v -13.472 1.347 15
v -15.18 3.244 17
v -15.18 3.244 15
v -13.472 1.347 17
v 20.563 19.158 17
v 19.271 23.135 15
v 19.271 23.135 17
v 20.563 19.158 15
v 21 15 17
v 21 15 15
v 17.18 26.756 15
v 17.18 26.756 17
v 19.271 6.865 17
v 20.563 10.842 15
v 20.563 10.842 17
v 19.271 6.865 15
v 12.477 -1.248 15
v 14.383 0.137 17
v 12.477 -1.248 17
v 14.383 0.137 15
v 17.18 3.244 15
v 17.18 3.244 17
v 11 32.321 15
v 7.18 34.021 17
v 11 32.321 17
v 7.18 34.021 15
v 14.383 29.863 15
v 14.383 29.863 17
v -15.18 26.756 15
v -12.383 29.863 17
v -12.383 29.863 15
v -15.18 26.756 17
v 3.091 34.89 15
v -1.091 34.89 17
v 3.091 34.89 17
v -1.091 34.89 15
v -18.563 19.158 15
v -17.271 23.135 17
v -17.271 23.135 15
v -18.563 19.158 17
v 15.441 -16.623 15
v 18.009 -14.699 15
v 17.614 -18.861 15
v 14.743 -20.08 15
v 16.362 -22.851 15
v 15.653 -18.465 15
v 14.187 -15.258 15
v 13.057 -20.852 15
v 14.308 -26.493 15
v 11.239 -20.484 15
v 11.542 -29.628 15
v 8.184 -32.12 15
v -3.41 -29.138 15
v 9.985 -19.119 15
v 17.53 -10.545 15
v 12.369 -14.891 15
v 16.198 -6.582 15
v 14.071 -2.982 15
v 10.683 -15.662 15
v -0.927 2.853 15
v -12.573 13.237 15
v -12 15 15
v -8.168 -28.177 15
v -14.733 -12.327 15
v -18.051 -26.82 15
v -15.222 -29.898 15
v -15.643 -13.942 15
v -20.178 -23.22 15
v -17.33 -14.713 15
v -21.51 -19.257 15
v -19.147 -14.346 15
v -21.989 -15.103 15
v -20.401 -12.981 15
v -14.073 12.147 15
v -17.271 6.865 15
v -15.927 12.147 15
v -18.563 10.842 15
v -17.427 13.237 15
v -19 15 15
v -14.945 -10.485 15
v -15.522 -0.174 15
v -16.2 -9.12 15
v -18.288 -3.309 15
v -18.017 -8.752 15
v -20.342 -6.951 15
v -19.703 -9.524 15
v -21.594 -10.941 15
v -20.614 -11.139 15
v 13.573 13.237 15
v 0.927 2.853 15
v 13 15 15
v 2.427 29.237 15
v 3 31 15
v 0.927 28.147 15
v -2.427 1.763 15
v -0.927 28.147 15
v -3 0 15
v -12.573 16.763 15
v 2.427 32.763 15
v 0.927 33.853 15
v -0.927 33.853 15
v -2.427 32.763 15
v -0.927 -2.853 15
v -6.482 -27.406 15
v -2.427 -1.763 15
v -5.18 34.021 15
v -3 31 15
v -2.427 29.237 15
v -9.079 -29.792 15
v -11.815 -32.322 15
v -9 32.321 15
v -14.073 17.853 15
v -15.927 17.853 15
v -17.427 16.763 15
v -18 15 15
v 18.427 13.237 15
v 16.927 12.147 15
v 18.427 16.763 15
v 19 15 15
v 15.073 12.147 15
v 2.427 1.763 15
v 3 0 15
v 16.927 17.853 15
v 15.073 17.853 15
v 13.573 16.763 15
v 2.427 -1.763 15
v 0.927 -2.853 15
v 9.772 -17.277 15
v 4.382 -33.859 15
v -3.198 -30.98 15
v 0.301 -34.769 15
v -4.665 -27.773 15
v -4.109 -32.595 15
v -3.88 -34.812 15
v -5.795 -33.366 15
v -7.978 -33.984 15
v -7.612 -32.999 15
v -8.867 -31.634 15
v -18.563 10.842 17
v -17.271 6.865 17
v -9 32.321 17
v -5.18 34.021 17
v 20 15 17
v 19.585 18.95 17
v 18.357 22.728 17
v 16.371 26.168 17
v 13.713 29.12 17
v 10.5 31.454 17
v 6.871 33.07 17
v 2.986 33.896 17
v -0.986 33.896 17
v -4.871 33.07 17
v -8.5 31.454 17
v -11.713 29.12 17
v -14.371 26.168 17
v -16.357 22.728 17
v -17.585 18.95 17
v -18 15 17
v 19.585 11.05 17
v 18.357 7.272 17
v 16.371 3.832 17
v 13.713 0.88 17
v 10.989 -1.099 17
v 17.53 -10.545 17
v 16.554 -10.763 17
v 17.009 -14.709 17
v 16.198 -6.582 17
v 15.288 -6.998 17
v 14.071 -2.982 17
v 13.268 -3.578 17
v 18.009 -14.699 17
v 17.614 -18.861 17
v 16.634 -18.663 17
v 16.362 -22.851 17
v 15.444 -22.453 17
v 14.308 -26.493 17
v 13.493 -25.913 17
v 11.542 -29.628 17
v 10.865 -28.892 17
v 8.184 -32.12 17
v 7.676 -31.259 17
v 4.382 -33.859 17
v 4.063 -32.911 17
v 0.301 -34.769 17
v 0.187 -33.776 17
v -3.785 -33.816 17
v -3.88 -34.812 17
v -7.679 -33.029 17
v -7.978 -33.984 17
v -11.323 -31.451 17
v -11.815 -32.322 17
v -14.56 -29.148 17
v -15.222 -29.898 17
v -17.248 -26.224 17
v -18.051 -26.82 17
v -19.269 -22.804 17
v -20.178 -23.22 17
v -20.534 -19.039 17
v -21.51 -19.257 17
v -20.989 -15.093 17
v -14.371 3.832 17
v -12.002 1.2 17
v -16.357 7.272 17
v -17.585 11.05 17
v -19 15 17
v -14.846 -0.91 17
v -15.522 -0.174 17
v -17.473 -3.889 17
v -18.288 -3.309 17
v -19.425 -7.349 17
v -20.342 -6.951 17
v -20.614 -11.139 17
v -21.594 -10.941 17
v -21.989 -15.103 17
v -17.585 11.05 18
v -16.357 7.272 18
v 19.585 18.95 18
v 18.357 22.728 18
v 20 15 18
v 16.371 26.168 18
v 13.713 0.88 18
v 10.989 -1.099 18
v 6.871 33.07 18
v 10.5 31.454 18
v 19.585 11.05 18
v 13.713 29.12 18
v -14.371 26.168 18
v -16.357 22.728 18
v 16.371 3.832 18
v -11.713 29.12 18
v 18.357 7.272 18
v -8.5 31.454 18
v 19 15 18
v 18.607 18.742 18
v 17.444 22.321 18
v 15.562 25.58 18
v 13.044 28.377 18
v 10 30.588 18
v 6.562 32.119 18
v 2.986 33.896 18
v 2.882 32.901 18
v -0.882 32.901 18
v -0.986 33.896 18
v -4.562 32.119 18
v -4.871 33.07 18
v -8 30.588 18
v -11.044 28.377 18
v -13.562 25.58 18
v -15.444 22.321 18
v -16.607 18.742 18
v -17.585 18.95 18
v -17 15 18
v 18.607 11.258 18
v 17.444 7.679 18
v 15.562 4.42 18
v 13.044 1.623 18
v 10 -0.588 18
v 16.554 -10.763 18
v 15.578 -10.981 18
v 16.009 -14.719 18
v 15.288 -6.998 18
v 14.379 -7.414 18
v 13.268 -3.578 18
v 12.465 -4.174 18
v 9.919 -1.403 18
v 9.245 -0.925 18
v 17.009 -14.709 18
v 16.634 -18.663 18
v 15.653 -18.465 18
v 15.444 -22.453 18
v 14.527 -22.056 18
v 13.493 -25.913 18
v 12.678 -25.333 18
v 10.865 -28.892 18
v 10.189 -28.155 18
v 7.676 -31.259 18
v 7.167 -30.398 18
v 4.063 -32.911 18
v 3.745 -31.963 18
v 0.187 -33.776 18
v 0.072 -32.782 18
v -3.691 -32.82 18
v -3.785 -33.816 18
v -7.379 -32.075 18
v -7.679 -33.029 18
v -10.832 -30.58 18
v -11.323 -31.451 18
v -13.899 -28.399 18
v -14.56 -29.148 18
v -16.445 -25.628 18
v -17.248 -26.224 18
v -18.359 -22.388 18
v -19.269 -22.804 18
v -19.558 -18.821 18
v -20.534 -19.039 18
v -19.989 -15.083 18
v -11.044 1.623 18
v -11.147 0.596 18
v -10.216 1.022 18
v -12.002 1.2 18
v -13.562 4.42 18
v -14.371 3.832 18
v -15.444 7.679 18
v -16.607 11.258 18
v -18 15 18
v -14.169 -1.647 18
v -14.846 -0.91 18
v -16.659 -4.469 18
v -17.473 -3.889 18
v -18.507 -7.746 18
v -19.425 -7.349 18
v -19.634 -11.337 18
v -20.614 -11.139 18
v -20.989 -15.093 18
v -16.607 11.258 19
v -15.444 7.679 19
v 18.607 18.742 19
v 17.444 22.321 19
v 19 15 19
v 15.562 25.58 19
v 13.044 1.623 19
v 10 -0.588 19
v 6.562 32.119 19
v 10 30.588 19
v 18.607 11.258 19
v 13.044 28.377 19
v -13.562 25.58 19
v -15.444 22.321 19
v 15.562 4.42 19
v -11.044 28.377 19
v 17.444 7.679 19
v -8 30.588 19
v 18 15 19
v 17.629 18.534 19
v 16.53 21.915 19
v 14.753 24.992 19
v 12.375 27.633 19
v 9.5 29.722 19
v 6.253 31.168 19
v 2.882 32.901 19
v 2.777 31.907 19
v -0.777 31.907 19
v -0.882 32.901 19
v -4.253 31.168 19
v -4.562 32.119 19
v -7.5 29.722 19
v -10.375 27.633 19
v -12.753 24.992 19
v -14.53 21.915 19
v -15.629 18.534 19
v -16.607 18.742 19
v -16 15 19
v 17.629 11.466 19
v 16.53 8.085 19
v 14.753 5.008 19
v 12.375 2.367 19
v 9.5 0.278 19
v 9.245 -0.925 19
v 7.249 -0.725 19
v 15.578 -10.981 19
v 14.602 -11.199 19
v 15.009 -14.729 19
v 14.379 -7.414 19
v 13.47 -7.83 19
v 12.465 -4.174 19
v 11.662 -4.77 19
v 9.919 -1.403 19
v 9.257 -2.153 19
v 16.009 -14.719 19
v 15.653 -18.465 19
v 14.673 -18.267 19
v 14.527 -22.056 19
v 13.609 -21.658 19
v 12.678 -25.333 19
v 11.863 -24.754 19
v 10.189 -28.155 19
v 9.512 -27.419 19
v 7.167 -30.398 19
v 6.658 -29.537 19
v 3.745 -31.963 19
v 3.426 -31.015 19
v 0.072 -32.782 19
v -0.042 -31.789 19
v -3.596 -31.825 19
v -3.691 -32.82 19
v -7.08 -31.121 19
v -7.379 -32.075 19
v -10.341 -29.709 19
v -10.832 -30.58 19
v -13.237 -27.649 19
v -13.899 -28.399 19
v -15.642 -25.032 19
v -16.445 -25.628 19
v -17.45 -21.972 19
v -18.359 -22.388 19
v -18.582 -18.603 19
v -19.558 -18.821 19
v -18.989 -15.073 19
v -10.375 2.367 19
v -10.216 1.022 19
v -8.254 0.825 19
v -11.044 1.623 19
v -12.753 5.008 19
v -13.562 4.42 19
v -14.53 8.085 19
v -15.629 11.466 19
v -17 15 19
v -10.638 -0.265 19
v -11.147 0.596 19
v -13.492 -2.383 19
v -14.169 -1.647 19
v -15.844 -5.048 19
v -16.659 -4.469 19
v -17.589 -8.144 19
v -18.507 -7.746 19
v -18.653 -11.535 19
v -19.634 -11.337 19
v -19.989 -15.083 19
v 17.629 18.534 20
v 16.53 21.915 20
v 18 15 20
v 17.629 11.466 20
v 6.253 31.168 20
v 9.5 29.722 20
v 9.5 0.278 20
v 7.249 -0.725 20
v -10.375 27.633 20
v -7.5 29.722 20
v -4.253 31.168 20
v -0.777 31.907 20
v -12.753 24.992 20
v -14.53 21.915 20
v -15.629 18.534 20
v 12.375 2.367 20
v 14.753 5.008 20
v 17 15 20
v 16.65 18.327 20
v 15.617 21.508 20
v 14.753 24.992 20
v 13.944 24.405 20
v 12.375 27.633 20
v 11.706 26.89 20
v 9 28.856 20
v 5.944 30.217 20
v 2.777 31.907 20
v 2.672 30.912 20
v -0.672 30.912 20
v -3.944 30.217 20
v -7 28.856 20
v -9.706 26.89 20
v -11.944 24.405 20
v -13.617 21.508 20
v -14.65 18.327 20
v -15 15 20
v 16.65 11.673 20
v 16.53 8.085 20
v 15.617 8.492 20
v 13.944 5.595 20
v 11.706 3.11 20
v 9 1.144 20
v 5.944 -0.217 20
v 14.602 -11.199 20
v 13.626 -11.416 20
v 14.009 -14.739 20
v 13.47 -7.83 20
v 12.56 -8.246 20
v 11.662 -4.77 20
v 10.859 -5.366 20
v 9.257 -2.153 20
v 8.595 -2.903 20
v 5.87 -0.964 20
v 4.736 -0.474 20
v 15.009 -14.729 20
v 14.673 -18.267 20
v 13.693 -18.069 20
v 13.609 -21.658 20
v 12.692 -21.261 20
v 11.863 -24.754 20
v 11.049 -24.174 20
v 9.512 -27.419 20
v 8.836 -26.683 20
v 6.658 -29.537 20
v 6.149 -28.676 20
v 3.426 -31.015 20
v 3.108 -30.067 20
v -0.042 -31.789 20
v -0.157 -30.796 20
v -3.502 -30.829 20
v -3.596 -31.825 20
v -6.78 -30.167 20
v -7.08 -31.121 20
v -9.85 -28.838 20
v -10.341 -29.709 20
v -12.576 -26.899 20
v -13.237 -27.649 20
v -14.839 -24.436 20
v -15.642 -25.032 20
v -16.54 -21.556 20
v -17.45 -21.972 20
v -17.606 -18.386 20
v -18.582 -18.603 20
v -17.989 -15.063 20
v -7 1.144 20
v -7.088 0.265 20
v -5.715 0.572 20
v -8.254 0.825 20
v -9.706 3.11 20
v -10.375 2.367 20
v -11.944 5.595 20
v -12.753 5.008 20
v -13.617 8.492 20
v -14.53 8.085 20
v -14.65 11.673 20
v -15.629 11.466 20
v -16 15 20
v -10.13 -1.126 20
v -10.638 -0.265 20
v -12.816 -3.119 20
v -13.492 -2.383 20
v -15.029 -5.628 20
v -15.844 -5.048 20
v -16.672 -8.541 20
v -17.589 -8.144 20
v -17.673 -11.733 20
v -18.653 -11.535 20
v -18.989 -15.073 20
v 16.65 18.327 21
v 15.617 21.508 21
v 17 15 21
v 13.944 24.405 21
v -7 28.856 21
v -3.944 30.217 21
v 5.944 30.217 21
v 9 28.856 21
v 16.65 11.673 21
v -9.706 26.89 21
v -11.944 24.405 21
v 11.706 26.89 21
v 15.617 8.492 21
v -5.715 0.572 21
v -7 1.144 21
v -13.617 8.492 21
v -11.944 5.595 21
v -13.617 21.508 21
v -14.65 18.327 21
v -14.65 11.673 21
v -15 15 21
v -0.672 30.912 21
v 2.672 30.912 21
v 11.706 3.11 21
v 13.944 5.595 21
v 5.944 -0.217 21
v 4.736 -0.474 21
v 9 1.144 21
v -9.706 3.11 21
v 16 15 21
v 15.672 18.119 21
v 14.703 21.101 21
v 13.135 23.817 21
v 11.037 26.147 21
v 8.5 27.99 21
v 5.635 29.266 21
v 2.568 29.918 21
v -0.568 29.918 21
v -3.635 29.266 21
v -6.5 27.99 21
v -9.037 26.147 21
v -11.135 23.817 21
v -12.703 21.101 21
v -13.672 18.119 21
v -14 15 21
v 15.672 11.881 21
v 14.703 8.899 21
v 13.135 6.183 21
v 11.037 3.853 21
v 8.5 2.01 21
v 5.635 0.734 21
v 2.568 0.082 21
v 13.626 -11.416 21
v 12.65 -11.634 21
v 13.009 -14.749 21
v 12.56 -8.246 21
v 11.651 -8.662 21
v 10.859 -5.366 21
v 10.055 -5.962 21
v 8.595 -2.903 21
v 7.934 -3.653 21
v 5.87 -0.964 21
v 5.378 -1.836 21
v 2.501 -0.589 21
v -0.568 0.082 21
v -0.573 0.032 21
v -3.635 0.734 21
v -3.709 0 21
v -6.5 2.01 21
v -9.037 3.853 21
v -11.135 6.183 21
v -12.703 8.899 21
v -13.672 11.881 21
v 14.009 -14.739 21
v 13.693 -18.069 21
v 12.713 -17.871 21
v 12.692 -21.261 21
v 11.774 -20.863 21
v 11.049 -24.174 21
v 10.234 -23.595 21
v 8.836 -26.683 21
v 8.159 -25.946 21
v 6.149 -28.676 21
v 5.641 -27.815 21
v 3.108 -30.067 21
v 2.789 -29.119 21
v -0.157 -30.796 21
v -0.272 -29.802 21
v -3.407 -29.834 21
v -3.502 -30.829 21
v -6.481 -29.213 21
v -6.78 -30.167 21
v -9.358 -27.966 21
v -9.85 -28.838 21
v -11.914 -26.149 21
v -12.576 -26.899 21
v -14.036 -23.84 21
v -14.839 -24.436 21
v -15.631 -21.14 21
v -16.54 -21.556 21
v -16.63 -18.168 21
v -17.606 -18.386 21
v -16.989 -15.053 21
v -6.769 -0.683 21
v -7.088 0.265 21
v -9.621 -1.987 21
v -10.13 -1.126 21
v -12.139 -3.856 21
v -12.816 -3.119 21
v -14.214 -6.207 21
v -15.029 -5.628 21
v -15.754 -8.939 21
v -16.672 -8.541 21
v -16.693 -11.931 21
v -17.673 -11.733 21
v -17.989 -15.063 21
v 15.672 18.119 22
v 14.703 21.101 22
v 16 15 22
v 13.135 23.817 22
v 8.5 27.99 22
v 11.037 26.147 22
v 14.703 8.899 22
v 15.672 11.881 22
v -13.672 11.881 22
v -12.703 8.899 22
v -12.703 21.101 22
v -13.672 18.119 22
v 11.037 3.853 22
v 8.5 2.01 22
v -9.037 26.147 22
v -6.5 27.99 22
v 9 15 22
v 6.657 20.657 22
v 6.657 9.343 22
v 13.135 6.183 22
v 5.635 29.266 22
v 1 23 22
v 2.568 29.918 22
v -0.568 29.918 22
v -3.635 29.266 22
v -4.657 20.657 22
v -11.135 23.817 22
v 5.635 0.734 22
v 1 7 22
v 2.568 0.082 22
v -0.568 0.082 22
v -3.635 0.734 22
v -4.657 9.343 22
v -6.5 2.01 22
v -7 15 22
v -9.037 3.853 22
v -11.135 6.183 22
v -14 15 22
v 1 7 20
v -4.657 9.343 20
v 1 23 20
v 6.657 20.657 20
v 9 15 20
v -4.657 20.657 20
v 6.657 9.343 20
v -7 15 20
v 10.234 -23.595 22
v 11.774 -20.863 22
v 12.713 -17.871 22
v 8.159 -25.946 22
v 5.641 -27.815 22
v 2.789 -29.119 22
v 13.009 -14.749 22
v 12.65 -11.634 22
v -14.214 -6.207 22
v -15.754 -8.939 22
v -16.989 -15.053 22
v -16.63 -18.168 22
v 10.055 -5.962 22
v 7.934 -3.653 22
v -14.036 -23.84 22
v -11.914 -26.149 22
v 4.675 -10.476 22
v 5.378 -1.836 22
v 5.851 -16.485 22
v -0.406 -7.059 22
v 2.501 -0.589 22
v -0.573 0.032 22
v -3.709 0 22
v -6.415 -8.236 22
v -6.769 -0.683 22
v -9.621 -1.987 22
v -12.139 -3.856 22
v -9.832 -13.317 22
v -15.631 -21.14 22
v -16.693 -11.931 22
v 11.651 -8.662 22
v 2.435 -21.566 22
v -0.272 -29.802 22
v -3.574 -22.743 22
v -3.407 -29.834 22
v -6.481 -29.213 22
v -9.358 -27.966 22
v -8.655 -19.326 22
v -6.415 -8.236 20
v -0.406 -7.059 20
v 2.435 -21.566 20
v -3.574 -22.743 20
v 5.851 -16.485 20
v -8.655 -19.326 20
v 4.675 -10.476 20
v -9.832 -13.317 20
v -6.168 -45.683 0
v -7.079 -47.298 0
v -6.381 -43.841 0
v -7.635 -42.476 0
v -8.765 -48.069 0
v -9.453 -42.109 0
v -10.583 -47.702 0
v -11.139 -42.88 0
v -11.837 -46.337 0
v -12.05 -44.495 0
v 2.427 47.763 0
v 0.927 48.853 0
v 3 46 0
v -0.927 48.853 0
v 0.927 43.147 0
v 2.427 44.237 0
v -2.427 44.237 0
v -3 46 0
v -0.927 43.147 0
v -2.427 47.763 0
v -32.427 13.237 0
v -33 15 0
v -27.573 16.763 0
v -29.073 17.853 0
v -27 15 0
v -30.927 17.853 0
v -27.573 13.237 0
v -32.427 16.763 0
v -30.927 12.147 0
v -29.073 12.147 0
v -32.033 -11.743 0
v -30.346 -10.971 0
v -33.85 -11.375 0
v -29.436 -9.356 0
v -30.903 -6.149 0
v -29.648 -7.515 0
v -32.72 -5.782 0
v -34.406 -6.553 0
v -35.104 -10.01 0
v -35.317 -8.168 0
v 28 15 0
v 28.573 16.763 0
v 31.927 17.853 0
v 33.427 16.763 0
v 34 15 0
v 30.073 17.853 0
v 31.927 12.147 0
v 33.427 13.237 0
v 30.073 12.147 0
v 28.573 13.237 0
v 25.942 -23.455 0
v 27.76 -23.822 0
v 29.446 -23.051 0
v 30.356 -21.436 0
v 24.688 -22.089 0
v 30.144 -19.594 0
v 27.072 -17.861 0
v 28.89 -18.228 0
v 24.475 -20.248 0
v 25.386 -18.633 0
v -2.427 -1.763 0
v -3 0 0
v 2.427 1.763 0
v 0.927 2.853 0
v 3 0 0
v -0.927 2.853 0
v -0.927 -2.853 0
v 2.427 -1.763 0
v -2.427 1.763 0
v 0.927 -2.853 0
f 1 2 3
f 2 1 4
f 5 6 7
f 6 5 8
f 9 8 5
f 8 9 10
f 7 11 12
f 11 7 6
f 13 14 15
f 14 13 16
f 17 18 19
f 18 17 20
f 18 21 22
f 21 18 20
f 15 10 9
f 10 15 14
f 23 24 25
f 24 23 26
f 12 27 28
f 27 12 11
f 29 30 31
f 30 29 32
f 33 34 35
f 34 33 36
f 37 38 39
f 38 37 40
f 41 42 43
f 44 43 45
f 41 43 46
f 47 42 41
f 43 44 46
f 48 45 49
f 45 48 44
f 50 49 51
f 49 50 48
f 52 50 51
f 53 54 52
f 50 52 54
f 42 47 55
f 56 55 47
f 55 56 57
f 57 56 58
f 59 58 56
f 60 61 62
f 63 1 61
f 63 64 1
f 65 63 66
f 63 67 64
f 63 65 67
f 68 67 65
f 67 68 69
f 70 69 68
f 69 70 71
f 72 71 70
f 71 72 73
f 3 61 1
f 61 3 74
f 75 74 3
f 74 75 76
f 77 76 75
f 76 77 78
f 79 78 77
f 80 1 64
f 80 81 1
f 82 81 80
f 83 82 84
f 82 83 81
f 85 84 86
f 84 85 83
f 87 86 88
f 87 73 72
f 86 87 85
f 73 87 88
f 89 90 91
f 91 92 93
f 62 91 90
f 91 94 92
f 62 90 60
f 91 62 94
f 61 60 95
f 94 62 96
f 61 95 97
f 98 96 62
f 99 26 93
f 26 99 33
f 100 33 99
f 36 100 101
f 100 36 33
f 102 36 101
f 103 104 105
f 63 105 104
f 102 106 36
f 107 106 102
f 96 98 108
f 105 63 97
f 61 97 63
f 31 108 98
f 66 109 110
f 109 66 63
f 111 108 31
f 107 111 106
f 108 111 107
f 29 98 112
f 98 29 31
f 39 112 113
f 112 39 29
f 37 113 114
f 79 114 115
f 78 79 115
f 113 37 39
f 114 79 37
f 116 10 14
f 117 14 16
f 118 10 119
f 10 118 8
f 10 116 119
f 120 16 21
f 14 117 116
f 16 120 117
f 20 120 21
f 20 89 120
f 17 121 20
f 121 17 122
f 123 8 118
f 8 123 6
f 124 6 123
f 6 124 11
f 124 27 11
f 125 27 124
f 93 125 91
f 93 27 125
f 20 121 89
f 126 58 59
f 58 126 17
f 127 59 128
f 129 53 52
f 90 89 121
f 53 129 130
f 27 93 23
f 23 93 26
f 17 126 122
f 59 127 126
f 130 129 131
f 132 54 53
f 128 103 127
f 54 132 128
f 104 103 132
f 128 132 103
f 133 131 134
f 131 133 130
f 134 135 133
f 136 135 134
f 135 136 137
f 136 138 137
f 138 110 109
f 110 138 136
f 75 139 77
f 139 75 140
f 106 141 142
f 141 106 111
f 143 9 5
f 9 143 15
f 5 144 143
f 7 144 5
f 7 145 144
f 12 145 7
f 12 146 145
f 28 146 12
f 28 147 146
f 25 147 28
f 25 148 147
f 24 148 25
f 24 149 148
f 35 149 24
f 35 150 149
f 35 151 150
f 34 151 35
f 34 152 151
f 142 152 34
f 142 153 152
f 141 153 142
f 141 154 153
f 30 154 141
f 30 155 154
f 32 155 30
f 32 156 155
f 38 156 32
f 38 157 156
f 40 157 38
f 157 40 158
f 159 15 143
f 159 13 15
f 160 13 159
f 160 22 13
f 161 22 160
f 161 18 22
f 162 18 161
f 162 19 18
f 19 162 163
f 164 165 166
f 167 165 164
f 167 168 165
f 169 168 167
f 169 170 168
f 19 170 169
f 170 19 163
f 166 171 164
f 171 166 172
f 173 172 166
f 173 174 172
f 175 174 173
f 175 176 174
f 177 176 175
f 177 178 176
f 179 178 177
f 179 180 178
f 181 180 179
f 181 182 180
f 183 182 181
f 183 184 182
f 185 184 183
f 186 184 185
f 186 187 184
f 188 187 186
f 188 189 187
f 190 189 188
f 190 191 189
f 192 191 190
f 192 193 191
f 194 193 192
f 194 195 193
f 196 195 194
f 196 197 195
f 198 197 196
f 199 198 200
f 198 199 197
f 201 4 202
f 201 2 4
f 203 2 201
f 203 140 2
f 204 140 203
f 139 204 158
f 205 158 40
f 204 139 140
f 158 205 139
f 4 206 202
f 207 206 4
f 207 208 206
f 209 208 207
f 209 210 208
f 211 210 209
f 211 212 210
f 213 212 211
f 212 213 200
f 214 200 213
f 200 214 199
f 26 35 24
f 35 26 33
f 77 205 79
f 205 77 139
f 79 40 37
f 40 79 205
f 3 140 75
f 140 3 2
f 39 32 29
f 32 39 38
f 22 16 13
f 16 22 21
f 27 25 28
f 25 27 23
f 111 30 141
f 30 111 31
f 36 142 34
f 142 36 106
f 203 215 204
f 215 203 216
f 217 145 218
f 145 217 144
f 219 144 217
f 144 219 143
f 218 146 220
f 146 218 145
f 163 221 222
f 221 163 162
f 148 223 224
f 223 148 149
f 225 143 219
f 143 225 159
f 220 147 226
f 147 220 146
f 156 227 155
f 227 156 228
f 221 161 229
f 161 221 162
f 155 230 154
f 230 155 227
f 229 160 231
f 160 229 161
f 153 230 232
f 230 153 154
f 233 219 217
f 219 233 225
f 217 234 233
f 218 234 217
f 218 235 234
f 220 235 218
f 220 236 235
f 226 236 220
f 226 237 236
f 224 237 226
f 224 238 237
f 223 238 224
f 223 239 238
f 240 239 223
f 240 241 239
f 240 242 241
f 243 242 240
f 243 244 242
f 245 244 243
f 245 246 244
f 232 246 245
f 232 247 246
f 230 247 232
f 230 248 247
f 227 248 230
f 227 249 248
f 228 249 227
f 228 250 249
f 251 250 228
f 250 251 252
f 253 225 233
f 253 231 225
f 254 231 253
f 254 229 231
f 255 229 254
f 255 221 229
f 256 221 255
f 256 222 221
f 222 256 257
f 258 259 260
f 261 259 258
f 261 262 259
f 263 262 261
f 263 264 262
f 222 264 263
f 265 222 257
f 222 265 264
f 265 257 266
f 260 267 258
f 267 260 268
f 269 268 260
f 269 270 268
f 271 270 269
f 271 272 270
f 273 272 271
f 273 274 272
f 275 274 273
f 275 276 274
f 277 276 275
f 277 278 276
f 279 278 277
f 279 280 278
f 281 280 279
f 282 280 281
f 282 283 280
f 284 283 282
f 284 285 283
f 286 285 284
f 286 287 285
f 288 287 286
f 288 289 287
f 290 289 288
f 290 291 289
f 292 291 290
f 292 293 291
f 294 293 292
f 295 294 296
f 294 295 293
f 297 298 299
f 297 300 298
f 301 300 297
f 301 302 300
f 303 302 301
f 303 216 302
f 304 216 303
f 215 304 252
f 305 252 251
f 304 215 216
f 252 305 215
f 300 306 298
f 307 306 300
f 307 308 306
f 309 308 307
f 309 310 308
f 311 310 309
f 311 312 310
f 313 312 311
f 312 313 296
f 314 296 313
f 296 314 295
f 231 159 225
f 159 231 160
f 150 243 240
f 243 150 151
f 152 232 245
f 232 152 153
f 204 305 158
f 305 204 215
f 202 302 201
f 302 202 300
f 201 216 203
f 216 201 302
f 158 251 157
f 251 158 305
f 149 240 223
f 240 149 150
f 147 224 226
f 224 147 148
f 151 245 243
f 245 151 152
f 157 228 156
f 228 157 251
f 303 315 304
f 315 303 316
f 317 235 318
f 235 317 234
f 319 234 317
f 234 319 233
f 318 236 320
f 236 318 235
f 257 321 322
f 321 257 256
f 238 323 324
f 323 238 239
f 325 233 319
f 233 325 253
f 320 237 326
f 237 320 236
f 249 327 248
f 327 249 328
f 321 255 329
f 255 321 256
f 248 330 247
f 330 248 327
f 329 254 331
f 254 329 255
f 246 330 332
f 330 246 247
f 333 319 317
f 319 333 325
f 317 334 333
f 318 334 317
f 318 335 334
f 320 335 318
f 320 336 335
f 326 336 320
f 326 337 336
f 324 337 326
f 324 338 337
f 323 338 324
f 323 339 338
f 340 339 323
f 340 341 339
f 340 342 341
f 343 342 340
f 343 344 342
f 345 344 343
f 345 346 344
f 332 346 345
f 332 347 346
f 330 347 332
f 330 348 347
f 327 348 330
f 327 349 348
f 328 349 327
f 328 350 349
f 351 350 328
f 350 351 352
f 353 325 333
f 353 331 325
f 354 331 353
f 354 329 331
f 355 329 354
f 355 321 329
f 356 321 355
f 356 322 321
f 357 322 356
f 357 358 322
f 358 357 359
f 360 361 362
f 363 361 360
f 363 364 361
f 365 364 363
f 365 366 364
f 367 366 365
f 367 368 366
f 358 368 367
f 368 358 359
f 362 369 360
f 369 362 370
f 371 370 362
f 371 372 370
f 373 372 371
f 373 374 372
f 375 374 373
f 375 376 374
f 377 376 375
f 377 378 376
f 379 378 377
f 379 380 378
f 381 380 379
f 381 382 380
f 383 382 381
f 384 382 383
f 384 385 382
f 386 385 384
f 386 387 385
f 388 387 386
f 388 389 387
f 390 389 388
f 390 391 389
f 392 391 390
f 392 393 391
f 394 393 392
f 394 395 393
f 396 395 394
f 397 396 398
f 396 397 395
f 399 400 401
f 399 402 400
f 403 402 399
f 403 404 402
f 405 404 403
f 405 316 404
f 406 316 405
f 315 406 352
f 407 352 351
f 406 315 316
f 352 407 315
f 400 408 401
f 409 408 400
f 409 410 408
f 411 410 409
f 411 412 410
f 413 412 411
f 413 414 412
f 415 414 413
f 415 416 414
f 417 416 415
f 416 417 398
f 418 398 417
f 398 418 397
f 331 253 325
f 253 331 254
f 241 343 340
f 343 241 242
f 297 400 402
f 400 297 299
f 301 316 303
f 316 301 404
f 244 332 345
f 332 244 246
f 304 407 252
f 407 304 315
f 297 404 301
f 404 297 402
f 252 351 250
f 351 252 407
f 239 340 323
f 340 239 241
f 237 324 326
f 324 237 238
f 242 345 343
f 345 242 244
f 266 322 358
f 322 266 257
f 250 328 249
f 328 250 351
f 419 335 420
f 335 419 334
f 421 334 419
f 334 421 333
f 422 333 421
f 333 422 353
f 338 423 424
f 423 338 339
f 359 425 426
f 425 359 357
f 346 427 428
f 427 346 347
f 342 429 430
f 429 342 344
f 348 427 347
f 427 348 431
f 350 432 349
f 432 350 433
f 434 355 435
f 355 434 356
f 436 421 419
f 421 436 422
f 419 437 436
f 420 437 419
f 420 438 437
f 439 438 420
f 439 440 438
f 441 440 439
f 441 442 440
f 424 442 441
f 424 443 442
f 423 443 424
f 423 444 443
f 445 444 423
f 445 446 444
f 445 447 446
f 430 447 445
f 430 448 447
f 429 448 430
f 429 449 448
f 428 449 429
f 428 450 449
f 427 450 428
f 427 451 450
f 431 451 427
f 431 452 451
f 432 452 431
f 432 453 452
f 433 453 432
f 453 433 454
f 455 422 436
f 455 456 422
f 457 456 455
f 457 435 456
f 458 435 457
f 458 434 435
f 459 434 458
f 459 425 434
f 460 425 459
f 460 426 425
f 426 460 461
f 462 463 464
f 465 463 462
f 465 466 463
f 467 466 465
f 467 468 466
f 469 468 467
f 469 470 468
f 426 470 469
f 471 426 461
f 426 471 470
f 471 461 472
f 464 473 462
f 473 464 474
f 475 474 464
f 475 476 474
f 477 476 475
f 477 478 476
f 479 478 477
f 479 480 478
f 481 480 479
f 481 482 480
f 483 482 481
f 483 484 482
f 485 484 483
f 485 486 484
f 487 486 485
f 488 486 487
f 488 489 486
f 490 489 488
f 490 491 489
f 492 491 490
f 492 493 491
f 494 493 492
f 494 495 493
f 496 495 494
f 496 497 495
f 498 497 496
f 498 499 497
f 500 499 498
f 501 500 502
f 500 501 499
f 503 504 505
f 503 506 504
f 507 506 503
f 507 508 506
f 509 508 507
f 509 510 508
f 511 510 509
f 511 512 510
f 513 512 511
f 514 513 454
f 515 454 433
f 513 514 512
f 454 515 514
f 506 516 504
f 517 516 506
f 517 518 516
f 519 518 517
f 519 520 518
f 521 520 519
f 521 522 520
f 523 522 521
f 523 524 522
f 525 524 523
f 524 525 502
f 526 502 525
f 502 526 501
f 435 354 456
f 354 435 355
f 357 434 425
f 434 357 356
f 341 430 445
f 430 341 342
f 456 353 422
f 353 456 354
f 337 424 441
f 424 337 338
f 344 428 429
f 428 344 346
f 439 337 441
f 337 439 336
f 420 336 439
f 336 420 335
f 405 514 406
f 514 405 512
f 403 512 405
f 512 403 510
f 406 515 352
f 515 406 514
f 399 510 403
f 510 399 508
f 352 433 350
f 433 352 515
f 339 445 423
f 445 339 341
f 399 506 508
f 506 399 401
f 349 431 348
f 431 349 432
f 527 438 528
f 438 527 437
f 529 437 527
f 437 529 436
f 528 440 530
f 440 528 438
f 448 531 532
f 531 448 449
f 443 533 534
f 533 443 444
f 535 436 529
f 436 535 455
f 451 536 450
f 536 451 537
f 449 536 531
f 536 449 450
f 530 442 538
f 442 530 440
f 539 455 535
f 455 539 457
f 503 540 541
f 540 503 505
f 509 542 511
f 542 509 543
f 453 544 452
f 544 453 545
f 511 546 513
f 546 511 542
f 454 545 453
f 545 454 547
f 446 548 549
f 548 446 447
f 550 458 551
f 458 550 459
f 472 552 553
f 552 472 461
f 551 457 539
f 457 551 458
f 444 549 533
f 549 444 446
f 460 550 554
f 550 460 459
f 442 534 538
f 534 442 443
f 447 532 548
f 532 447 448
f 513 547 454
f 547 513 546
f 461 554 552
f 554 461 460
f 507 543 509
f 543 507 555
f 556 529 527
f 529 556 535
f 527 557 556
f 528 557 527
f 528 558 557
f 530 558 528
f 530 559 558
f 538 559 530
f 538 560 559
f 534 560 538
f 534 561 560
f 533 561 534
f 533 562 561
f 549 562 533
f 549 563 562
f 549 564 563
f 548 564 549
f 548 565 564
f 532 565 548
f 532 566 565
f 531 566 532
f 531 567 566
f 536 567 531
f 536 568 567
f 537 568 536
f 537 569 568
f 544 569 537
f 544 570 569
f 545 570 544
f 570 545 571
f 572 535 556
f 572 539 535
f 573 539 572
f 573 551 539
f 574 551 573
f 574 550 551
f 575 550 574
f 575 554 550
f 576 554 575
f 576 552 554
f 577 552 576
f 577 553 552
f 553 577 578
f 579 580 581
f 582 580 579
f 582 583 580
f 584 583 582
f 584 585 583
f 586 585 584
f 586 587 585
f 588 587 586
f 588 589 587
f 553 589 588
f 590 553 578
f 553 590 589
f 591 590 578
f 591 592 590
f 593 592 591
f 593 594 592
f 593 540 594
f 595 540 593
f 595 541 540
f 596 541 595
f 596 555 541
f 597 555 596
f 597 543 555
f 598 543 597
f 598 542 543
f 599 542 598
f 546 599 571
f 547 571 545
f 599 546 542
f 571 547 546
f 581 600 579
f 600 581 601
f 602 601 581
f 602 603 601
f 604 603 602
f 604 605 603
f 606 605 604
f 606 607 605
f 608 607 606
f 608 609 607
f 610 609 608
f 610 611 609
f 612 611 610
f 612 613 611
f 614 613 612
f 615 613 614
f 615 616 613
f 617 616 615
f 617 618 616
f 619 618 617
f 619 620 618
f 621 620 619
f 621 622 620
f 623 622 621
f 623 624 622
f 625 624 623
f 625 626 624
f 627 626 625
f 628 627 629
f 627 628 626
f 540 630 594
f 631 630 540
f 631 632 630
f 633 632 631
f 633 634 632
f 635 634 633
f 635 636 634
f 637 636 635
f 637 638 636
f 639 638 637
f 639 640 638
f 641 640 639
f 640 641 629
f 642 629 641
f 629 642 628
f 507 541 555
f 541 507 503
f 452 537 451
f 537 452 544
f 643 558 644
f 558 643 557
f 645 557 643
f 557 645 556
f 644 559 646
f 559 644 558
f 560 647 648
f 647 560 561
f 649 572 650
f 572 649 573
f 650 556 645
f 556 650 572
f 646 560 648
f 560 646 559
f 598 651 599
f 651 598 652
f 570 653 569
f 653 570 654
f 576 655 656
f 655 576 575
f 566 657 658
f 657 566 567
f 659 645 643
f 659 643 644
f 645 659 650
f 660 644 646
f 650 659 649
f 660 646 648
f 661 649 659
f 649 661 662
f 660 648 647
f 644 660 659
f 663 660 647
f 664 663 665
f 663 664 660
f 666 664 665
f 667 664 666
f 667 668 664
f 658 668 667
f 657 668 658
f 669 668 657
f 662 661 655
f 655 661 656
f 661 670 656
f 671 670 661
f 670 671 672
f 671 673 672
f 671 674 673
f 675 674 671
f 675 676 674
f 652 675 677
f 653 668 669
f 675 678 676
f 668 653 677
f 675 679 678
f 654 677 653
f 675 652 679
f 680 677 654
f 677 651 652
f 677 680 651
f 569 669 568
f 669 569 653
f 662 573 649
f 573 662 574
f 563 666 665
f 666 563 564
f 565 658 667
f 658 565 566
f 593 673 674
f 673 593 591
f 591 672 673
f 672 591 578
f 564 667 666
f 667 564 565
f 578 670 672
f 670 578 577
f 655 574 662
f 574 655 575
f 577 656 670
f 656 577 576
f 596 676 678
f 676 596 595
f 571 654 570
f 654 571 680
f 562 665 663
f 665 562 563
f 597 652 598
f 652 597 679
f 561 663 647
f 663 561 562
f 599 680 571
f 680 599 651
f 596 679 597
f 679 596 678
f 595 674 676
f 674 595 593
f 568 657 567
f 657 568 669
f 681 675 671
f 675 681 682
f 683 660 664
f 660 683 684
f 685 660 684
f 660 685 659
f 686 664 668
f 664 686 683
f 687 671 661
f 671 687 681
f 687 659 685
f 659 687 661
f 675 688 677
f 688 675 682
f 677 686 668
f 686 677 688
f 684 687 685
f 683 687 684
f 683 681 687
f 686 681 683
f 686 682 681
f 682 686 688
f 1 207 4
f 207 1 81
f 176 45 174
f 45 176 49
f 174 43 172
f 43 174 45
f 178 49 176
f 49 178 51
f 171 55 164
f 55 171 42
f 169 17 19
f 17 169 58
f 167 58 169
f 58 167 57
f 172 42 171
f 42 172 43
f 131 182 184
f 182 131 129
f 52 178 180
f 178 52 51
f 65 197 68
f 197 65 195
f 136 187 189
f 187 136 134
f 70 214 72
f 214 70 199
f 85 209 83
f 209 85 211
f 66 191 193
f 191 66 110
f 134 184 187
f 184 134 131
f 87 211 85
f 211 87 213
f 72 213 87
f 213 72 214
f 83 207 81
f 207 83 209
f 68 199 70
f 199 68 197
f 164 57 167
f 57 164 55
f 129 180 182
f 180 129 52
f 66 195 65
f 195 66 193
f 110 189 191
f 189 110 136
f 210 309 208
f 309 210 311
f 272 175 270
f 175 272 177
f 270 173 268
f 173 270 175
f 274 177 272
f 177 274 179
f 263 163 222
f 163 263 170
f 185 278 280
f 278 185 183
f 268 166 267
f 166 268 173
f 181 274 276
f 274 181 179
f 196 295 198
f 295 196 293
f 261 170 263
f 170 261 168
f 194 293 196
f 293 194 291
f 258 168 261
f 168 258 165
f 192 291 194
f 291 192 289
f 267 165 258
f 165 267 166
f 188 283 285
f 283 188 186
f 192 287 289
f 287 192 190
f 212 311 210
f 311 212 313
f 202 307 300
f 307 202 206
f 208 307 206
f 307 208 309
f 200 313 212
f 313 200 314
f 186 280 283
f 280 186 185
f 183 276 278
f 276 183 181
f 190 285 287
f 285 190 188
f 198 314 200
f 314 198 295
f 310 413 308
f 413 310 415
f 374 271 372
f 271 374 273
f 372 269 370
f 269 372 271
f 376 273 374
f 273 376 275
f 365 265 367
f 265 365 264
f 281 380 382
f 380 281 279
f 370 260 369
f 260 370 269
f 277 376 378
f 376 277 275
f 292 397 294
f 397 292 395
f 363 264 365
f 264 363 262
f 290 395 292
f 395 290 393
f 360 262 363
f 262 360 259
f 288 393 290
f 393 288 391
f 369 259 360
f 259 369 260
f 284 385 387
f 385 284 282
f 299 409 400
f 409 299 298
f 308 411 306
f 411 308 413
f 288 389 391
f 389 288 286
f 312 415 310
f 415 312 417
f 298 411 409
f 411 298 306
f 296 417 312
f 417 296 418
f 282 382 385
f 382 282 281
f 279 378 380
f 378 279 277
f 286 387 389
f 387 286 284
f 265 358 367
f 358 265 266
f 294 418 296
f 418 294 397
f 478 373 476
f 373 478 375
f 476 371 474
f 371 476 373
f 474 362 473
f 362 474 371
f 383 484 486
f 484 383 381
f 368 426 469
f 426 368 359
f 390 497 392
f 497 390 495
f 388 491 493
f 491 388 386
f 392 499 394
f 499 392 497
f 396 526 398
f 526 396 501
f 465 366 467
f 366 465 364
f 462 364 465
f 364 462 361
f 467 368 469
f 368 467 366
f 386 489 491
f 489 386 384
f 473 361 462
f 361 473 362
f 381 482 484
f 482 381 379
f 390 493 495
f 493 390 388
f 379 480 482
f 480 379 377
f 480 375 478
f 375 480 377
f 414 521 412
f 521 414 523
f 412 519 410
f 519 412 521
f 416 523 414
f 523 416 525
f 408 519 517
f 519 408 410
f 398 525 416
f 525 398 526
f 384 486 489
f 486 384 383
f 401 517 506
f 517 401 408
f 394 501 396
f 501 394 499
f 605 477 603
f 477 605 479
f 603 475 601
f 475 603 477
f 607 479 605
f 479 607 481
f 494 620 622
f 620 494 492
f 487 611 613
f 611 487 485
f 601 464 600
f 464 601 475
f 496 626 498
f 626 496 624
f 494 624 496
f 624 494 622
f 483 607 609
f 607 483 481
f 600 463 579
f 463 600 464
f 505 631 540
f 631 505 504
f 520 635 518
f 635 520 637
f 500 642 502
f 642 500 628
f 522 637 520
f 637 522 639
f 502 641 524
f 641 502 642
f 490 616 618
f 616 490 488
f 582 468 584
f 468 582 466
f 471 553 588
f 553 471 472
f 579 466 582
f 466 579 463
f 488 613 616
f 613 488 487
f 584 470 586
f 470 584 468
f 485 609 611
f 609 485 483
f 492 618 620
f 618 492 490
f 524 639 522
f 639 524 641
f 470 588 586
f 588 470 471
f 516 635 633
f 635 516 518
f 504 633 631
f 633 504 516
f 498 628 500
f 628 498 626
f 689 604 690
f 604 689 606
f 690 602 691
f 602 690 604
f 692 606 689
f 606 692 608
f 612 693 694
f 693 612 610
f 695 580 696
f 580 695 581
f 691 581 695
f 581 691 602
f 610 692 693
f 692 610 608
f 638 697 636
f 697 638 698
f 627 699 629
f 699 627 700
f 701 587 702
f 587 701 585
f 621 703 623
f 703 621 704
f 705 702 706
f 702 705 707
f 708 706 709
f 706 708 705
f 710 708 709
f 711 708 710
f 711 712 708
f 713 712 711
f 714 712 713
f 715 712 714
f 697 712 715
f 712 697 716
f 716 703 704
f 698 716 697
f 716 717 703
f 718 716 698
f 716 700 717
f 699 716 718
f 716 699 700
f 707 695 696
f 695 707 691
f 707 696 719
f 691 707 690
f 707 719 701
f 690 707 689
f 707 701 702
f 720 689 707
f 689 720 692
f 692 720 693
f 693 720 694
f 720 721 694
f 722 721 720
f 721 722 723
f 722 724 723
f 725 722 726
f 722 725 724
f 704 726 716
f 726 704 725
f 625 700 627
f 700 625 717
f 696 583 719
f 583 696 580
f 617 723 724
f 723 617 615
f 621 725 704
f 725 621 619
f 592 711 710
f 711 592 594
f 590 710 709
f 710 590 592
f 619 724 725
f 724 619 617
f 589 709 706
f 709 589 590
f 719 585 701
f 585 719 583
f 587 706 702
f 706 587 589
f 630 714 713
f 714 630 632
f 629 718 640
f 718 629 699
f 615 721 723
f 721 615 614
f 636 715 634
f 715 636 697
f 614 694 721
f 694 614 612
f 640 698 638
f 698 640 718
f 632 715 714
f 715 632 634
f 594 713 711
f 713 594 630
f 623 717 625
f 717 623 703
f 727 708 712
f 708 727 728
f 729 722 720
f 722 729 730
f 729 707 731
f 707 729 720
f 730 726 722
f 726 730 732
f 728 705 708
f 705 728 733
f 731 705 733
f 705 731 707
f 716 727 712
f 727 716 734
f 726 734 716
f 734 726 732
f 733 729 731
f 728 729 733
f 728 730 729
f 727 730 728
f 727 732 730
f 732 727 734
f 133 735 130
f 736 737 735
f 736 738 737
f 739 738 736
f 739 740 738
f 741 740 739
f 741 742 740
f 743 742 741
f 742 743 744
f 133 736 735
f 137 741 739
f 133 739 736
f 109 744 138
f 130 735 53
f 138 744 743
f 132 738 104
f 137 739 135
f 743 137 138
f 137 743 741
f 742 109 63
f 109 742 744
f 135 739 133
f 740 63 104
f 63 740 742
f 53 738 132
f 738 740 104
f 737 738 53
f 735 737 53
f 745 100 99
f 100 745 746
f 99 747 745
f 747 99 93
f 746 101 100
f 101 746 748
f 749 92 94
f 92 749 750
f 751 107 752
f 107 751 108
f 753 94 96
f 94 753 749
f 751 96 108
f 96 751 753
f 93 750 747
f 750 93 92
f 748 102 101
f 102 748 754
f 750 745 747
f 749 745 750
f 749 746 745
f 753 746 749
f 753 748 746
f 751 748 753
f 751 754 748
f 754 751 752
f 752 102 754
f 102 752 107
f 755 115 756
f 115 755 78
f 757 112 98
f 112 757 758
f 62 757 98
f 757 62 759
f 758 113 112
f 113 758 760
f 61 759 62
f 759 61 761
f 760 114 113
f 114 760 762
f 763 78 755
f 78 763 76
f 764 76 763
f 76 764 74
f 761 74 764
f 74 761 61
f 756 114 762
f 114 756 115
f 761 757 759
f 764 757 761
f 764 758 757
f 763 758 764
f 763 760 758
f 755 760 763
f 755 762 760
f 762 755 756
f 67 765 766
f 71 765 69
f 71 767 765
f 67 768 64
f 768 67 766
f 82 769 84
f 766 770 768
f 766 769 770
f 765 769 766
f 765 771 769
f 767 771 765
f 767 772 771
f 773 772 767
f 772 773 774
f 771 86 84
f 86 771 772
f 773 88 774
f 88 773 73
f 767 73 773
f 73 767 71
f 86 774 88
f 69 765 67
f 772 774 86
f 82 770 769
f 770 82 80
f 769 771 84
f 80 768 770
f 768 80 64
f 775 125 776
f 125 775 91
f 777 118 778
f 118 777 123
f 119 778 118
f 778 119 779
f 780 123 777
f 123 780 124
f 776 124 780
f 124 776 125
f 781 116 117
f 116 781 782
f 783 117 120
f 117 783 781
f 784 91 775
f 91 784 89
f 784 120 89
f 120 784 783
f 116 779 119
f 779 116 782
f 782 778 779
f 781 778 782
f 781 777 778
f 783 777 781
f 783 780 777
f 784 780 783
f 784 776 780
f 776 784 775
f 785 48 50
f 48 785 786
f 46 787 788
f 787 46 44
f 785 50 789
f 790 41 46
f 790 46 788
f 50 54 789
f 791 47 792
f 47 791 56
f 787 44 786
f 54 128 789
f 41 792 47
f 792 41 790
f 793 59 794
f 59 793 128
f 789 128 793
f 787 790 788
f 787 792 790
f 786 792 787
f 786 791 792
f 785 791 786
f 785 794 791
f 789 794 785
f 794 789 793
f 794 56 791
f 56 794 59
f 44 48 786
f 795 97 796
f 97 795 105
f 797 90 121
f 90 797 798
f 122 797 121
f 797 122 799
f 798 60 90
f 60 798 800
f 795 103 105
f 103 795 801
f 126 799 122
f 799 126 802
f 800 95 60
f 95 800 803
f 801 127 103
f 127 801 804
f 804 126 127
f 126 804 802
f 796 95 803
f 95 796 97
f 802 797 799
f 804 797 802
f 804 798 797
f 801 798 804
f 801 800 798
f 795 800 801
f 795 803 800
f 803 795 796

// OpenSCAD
difference(){
		translate([1,15,15]) 
		for(i = [0:5]){
			translate([0,0,i])
			cylinder(h=2, r=(20-i), fn = 8); 
		}
		translate([1,15,20])
		cylinder(h=2, r=8, $fn = 8);	
	}

mirror([1,10,0]) 
	difference(){
		translate([1,15,15]) 
		for(i = [0:5]){
			translate([0,0,i])
			cylinder(h=2, r=(20-i), 	fn = 8);
		}
		translate([1,15,20])
		cylinder(h=2, r=8, $fn = 8);
	}
 		
mirror([1,10,0]) 
	multmatrix(m = [ [1, 0, 0, 0],
                 [0, 1, -1, 46],
                 [0, 0, 1, 0],
                 [0, 0, 0,  1]
               ]) 
	cylinder(h=15,r=3); 
	
	multmatrix(m = [ [1, 0, 0, 0],
                 [0, 1, -1, 46],
                 [0, 0, 1, 0],
                 [0, 0, 0,  1]
               ]) 
	cylinder(h=15,r=3); 
	
	multmatrix(m = [ [1, 0, 1, -30],
                 [0, 1, 0, 15],
                 [0, 0, 1, 0],
                 [0, 0, 0,  1]
               ]) 
	cylinder(h=15,r=3); 

mirror([1,10,0]) 
	multmatrix(m = [ [1, 0, 1, -30],
                 [0, 1, 0, 15],
                 [0, 0, 1, 0],
                 [0, 0, 0,  1]
               ]) 
	cylinder(h=15,r=3); 


	multmatrix(m = [ [1, 0, -1, 31],
                 [0, 1, 0, 15],
                 [0, 0, 1, 0],
                 [0, 0, 0,  1]
               ]) 
	cylinder(h=15,r=3); 

mirror([1,10,0]) 
	multmatrix(m = [ [1, 0, -1, 31],
                 [0, 1, 0, 15],
                 [0, 0, 1, 0],
                 [0, 0, 0,  1]
               ]) 
	cylinder(h=15,r=3); 

translate([0,0,5]);
cylinder(h=15,r=3);

 
